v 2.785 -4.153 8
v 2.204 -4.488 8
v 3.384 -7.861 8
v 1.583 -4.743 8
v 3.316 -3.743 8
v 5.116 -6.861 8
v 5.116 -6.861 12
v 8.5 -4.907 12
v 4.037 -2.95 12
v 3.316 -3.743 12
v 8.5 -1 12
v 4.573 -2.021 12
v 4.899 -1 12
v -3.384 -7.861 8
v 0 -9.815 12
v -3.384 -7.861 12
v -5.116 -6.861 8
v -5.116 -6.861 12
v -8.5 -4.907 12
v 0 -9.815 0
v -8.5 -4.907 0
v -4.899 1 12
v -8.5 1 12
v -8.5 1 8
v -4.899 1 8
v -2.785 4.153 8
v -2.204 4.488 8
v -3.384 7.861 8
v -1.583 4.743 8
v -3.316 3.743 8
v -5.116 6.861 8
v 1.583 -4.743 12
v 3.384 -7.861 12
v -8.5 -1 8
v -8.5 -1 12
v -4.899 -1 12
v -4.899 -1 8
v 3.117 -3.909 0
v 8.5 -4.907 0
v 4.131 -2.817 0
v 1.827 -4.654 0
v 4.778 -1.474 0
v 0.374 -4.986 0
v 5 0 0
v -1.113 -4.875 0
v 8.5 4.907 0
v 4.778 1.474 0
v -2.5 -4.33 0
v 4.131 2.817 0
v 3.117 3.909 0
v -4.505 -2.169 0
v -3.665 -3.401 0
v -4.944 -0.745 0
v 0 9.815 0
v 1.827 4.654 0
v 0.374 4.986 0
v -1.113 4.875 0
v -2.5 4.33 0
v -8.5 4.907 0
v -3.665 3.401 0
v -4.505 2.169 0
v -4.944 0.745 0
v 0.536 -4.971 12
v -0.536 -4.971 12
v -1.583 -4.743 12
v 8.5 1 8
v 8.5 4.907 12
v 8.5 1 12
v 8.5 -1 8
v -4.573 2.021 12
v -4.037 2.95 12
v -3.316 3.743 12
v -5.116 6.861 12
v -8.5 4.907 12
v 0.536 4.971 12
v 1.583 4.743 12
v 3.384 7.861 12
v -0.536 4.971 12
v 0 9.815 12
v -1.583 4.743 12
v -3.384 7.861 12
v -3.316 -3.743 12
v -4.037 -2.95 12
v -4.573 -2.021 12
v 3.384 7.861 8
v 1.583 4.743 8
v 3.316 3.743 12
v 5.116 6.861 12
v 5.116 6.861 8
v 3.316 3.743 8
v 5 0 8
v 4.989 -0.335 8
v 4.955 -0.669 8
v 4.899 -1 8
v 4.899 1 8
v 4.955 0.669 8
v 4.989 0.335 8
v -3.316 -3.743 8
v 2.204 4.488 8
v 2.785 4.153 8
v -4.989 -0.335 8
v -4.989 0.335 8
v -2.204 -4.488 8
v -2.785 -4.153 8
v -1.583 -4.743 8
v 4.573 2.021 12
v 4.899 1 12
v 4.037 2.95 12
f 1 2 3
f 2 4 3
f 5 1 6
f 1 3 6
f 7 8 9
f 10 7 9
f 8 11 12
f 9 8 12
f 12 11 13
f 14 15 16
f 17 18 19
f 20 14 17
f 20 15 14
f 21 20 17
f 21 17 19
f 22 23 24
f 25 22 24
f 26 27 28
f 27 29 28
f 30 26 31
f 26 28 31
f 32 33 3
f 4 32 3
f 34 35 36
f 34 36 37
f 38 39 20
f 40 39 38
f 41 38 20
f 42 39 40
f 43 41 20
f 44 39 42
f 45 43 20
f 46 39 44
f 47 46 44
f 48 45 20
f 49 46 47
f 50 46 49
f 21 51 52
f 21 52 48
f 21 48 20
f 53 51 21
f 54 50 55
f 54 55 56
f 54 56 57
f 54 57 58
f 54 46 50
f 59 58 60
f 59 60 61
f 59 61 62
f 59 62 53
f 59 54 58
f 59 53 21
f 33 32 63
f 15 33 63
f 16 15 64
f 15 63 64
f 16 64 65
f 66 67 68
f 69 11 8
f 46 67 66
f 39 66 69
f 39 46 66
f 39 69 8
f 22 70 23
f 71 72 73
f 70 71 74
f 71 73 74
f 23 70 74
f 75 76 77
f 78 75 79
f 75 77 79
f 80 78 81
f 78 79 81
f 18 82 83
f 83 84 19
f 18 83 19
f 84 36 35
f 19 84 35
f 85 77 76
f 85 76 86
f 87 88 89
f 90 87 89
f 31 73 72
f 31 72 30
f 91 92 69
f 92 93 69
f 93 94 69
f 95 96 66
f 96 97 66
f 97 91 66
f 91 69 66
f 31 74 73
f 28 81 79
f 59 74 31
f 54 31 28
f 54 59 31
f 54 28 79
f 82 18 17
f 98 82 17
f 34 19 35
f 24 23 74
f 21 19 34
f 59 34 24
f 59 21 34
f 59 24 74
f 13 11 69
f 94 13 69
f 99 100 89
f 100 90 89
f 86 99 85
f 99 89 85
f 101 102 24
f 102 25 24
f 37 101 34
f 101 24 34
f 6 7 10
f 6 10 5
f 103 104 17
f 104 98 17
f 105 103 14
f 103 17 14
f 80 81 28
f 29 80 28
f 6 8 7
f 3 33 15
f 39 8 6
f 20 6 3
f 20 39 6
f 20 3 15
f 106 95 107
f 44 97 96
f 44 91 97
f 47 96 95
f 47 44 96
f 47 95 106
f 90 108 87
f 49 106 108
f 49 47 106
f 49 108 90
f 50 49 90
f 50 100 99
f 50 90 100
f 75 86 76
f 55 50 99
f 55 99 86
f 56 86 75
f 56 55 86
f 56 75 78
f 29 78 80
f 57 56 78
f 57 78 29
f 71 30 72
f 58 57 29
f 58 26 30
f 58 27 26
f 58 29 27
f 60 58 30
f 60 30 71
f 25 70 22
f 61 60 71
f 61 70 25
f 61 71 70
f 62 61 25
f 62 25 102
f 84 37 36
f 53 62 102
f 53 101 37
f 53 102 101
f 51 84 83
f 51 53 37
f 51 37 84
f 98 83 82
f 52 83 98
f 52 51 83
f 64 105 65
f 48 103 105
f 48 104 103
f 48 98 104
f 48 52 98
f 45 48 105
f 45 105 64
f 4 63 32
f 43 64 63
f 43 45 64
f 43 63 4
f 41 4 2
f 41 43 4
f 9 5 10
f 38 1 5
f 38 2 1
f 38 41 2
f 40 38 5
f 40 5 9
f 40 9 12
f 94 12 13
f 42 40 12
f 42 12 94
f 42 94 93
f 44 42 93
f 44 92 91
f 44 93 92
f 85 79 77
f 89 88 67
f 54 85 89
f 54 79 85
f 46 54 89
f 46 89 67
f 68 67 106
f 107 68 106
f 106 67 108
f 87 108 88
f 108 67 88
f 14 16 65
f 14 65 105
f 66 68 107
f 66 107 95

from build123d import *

# Parameters (mm, degrees)
ESBO_O2_R                  = 5
RESSALTO_EXTRUS_O2_DEPTH   = 12
CORTE_EXTRUS_O1_REACH      = 25.007
CORTE_EXTRUS_O1_END_RADIUS = 5
ESBO_O3_W                  = 4
ESBO_O3_H                  = 2
PADR_OCIRCULAR1_COUNT      = 6


with BuildPart() as part:
    # Esboço2 → Ressalto-extrusão2 (new body)
    with BuildSketch(Plane.XY):
        Polygon((0, 9.814954576), (8.5, 4.907477288), (8.5, -4.907477288), (0, -9.814954576), (-8.5, -4.907477288), (-8.5, 4.907477288), align=None)
        Circle(ESBO_O2_R, mode=Mode.SUBTRACT)
    extrude(amount=RESSALTO_EXTRUS_O2_DEPTH)

    # Corte-extrusão1: up to this cylinder (the profile starts outside it)
    corte_extrus_o1_end = Plane(origin=(0, 0, 10), z_dir=(0, 0, -1)) * Cylinder(CORTE_EXTRUS_O1_END_RADIUS, 61.014, mode=Mode.PRIVATE)
    # Esboço3 → Corte-extrusão1 (cut, up to the surface)
    with BuildSketch(Plane(origin=(8.5, 0, 0), x_dir=(0, 0, -1), z_dir=(1, 0, 0)), mode=Mode.PRIVATE) as corte_extrus_o1_sk1:
        with Locations((-10, 0)):
            Rectangle(ESBO_O3_W, ESBO_O3_H)
    corte_extrus_o1_tool1 = extrude(corte_extrus_o1_sk1.sketch, amount=-CORTE_EXTRUS_O1_REACH, mode=Mode.PRIVATE) - corte_extrus_o1_end
    corte_extrus_o1 = corte_extrus_o1_tool1.solids().sort_by_distance((8.5, 0, 10))[0]
    add(corte_extrus_o1, mode=Mode.SUBTRACT)

    # PadrãoCircular1: Corte-extrusão1 ×6 about axis
    padr_ocircular1_axis = Axis((0, 0, 0), (0, 0, 1))
    for i in range(1, PADR_OCIRCULAR1_COUNT):
        add(corte_extrus_o1.rotate(padr_ocircular1_axis, i * 360 / PADR_OCIRCULAR1_COUNT), mode=Mode.SUBTRACT)


solid = part.part
